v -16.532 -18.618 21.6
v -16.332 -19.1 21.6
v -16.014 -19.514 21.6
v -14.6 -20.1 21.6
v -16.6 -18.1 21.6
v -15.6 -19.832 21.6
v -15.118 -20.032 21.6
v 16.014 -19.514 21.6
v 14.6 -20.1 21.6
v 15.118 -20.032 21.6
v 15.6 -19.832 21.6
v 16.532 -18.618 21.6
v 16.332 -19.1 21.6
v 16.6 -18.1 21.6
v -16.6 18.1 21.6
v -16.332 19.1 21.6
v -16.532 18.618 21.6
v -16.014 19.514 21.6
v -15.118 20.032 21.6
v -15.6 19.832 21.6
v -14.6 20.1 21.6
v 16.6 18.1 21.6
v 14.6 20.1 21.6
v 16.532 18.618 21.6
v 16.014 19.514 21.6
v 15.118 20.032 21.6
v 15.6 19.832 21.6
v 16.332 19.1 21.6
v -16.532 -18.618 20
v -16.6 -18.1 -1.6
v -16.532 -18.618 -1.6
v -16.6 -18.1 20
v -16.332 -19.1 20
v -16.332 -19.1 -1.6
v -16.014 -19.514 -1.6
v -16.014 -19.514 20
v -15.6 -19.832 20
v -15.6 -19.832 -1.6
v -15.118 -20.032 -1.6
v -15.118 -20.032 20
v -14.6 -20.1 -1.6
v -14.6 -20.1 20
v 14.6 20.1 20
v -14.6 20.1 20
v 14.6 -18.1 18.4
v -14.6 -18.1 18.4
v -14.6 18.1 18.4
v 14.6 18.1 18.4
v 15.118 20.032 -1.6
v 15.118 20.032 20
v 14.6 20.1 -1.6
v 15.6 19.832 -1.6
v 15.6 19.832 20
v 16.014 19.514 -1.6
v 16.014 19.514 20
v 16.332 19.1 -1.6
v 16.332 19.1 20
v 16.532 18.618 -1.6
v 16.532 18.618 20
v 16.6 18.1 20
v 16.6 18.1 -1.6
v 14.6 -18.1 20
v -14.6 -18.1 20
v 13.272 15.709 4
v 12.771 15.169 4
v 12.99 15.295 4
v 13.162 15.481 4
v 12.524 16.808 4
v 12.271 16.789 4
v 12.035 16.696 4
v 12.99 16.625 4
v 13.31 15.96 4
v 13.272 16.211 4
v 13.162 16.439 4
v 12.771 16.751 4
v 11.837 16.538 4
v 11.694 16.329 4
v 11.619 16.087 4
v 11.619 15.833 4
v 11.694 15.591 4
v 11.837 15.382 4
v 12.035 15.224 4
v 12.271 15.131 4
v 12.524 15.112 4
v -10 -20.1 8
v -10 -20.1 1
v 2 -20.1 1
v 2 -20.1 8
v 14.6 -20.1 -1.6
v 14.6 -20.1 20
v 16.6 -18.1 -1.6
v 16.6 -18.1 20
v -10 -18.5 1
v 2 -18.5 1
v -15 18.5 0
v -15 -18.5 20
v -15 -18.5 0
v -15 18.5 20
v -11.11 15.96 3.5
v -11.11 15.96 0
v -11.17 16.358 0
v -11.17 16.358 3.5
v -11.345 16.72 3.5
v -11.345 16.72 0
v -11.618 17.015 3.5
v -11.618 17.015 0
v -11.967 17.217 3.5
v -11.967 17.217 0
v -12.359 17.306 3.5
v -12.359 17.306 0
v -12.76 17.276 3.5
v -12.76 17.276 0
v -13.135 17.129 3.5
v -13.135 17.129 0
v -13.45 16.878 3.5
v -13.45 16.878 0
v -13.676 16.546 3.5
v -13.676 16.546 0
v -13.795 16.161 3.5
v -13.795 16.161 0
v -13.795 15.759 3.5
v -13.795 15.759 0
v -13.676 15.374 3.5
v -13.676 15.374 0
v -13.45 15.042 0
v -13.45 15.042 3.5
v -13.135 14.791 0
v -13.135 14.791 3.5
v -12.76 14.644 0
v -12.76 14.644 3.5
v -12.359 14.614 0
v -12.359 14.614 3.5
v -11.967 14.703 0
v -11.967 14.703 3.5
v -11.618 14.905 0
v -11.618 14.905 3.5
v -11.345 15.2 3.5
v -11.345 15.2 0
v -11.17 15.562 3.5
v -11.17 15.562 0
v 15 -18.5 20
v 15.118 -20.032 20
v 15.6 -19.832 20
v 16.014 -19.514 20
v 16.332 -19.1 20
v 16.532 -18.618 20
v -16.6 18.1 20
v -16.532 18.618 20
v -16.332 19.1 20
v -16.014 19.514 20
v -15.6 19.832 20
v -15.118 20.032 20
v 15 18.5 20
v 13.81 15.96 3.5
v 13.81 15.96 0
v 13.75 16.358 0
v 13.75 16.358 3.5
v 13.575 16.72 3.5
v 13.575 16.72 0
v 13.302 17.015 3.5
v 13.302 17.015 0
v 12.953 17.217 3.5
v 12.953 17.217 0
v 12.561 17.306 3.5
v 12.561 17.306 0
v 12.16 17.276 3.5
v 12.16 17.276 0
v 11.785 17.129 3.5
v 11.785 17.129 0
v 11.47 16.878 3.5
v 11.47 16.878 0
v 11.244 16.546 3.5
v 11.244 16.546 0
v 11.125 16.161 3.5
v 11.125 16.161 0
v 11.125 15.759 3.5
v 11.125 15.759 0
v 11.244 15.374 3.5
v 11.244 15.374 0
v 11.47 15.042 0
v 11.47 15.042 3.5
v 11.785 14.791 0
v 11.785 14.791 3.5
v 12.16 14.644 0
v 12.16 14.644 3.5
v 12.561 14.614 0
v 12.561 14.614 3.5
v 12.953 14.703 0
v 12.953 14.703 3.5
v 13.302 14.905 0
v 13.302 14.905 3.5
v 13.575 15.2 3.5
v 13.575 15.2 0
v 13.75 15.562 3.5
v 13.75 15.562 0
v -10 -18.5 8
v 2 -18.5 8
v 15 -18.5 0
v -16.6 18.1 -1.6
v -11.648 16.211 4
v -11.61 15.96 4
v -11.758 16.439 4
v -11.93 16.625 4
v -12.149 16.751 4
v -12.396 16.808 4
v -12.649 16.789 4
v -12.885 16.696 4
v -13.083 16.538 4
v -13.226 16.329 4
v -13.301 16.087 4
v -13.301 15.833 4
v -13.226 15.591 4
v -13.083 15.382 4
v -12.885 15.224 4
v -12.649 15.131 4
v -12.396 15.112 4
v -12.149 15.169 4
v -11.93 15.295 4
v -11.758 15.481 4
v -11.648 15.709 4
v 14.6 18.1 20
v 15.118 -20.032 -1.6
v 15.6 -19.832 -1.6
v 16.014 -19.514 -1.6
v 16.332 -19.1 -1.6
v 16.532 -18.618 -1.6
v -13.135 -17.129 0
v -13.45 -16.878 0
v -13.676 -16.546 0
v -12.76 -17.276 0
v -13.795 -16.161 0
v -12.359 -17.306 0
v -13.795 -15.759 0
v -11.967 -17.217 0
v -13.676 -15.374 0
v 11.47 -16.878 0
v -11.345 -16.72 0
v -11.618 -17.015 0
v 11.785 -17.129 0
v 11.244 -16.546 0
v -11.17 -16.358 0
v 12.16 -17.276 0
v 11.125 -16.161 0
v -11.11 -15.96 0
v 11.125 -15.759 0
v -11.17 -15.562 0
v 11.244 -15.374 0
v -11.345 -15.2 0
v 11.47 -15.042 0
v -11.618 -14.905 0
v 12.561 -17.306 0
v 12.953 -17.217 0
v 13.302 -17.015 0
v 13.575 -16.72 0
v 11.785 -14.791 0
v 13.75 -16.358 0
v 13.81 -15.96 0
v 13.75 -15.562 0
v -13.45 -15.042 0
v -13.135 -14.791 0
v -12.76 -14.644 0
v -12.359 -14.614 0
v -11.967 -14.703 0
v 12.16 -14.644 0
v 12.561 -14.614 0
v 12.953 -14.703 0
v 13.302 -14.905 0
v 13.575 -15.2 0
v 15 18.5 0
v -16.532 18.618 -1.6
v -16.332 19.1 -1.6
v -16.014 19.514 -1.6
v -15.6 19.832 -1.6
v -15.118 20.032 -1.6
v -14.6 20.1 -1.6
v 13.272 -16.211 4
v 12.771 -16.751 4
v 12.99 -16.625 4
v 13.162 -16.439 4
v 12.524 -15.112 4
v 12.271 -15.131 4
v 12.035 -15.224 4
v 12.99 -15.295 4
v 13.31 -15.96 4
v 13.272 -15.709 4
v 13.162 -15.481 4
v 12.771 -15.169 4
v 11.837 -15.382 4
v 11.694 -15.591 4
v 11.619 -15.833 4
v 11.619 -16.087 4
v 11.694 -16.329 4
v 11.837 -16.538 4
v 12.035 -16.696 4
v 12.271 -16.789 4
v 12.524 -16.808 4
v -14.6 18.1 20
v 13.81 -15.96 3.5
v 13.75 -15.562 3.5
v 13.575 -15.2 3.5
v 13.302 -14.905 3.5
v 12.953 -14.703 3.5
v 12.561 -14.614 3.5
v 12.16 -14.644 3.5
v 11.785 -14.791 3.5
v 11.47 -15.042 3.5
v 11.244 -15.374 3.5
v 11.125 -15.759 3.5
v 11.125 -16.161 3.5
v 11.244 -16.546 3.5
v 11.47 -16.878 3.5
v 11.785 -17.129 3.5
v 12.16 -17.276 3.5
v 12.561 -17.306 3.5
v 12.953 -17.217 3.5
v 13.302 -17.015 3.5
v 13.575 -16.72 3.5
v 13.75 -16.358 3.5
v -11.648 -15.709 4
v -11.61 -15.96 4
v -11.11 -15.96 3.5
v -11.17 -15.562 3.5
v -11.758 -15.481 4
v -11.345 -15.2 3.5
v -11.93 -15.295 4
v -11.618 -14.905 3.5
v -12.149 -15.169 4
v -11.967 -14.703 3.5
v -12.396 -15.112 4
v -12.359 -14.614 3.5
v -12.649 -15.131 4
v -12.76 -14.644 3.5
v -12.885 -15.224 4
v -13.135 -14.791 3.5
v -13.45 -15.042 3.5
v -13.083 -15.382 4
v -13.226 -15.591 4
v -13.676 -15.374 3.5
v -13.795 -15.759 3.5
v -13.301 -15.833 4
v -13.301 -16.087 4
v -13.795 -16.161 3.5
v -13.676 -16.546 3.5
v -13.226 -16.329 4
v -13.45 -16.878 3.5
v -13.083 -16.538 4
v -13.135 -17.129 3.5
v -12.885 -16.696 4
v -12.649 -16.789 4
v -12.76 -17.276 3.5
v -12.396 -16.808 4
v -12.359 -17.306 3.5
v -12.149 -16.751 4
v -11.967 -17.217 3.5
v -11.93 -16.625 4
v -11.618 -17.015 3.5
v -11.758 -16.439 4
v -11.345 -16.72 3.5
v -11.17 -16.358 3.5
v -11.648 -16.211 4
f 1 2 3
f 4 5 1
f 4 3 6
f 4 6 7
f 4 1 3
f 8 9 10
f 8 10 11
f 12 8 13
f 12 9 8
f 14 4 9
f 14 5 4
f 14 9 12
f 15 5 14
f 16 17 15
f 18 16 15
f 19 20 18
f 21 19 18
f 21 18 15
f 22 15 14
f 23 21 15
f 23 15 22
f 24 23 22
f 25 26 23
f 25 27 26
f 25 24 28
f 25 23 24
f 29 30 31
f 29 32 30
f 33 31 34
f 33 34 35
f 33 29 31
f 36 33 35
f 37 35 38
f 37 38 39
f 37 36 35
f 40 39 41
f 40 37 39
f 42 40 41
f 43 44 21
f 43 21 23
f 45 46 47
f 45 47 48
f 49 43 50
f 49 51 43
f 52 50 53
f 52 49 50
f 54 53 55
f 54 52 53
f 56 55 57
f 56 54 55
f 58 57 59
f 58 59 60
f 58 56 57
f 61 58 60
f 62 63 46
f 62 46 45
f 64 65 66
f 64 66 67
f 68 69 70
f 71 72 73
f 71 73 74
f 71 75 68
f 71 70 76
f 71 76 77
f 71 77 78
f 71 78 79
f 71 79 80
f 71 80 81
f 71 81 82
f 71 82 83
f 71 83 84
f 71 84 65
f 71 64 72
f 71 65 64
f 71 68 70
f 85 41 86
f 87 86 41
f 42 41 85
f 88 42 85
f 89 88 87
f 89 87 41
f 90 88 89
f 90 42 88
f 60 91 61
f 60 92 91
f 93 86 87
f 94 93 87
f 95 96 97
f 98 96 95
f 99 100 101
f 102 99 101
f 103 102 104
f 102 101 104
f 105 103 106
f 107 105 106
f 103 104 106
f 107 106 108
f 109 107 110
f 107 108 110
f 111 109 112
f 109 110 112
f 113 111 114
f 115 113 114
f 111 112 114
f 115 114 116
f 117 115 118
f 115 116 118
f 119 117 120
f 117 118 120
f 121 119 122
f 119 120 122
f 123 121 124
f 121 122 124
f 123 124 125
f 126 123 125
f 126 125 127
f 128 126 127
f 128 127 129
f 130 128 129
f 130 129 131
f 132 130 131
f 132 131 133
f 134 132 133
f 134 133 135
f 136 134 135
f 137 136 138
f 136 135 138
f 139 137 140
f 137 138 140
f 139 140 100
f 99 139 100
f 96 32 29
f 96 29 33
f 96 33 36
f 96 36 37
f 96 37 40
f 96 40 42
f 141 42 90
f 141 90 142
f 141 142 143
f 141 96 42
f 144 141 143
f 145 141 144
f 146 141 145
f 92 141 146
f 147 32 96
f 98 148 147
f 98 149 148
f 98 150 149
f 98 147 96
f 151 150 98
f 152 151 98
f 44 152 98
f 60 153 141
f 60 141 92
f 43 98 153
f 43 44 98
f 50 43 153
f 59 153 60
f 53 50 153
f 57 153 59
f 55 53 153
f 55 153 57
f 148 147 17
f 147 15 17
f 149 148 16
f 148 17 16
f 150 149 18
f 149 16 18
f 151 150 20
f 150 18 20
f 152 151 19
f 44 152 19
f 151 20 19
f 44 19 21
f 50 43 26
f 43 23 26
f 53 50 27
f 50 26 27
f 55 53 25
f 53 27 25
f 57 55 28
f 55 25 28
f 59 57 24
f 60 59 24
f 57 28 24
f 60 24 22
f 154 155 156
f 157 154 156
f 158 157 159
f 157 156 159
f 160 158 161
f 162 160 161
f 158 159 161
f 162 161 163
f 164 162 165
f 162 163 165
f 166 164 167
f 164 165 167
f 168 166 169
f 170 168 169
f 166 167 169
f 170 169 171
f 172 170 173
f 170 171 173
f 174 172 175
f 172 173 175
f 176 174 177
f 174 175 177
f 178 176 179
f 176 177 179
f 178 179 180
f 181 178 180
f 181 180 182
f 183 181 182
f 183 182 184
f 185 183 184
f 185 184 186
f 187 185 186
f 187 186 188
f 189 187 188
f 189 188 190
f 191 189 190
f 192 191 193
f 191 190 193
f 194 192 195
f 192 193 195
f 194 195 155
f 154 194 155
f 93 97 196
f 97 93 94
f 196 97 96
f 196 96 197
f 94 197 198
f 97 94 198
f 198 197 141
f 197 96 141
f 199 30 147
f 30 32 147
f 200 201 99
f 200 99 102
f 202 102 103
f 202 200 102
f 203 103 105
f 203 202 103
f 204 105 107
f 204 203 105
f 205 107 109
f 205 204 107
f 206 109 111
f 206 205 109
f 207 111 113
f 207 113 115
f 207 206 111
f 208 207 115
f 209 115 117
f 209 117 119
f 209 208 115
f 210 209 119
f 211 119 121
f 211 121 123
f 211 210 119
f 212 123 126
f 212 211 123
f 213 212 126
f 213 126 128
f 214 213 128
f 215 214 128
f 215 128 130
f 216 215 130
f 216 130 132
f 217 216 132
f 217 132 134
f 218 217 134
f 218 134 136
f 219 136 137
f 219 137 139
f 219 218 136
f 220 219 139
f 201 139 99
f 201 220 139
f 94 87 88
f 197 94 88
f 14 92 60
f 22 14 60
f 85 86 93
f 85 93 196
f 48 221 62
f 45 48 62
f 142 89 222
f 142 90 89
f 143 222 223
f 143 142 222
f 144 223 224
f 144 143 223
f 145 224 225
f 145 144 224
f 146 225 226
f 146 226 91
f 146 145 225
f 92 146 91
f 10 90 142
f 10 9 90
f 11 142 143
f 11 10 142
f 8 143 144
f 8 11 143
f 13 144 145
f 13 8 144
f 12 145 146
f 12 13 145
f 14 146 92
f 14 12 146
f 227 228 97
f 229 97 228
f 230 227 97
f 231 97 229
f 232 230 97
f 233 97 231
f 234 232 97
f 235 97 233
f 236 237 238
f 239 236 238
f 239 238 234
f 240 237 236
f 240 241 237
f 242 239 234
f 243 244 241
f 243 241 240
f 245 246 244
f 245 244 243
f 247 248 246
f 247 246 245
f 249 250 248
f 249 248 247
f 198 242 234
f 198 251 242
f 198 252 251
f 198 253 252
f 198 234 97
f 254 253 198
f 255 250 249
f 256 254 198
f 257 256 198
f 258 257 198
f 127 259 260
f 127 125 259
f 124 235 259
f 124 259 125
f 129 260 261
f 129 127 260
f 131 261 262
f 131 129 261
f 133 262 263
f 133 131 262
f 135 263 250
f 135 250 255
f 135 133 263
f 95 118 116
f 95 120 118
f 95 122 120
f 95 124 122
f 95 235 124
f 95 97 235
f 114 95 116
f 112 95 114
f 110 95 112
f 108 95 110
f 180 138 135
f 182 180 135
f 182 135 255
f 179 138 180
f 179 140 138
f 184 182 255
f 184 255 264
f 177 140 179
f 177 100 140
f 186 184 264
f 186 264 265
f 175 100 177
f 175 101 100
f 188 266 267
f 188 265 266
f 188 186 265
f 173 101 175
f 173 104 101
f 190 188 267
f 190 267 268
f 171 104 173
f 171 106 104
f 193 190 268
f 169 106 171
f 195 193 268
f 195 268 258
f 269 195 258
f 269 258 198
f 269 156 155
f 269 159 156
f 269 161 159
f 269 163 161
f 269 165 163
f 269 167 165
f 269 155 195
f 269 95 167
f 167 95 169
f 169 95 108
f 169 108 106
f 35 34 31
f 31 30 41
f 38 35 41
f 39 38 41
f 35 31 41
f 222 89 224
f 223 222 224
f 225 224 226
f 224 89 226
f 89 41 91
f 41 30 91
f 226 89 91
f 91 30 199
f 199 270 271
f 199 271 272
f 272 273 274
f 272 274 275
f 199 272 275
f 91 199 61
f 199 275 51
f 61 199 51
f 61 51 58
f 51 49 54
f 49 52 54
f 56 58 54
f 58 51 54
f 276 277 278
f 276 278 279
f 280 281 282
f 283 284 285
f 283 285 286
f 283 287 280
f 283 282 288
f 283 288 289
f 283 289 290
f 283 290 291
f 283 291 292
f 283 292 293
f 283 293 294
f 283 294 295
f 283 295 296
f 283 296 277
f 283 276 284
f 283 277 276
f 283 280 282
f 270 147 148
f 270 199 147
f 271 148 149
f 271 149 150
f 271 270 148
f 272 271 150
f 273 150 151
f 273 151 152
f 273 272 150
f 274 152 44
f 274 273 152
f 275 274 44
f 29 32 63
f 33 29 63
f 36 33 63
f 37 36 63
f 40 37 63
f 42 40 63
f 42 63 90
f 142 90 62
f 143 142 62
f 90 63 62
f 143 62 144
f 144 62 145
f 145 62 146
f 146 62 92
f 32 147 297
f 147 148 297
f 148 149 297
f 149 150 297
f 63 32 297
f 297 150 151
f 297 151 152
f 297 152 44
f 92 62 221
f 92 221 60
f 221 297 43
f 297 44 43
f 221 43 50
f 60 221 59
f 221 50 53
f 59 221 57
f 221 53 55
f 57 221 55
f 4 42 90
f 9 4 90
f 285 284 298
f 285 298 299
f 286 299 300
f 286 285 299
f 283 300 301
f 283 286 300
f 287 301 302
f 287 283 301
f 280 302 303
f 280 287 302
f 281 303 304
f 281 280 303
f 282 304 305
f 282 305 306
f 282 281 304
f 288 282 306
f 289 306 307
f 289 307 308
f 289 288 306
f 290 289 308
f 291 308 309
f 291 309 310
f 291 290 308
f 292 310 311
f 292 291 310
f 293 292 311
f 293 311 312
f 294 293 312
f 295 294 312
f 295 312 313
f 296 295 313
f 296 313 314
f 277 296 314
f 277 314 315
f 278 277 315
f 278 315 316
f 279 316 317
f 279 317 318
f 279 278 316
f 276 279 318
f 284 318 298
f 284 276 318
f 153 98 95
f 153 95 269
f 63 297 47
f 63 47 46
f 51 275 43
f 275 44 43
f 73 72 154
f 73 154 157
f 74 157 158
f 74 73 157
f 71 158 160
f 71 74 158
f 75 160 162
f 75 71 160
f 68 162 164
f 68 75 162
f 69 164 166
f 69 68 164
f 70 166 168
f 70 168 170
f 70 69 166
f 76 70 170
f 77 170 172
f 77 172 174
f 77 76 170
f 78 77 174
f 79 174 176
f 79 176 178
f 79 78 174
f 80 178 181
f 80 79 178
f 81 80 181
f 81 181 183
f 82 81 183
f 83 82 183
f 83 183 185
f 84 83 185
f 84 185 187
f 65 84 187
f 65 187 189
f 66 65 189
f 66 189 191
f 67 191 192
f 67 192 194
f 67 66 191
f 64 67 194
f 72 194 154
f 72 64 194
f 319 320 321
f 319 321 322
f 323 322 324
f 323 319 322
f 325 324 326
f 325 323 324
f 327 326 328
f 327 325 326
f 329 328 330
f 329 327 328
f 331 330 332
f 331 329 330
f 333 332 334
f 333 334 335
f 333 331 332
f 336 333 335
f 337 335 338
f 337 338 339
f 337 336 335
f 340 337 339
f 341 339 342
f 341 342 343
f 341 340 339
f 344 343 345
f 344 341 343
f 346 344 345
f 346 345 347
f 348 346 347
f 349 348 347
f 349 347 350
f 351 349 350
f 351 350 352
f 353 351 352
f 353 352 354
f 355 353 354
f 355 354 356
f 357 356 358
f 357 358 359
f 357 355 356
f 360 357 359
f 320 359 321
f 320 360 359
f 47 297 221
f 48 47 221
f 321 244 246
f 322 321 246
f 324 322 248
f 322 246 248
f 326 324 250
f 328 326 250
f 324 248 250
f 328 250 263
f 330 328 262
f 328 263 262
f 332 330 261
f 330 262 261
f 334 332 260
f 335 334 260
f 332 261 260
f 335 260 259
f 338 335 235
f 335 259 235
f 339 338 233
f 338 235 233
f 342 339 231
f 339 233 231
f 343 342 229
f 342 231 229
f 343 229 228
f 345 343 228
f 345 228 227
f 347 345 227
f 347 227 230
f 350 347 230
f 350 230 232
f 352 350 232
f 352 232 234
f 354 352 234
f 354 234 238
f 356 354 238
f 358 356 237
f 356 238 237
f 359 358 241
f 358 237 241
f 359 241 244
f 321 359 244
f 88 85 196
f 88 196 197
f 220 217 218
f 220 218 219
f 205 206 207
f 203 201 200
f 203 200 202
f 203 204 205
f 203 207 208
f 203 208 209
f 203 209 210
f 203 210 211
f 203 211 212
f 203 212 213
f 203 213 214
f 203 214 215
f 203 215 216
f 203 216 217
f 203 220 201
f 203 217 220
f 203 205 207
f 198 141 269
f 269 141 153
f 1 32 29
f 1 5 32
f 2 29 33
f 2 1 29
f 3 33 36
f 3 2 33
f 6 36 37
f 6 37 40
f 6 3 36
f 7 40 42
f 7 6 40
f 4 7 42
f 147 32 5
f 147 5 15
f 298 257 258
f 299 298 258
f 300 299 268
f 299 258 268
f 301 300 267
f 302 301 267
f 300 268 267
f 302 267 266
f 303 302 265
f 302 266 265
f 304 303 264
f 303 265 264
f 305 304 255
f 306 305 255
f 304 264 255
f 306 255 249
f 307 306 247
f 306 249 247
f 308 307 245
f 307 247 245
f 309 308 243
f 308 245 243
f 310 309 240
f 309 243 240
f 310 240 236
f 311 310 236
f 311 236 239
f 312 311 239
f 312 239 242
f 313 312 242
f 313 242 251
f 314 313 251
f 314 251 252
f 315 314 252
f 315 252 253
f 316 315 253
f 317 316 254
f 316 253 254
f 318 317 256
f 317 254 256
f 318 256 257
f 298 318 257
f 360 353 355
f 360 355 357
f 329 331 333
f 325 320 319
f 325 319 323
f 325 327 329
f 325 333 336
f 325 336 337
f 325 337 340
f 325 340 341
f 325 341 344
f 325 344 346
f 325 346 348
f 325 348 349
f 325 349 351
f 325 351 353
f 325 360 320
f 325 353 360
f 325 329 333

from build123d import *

# Parameters (mm, degrees)
F0_W          = 33.2
F0_H          = 40.2
F0_W_2        = 30
F0_H_2        = 37
F1_DEPTH      = 20
F1_DEPTH_BACK = 1.6
F2_DEPTH      = 1.6
F3_R          = 1.35
F4_DEPTH      = 4
F5_SIZE       = 0.5
F6_W          = 33.2
F6_H          = 40.2
F6_W_2        = 30
F6_H_2        = 37
F7_DEPTH      = 1.6
F8_W          = 29.2
F8_H          = 36.2
F9_DEPTH      = 1.6
F10_W         = 12
F10_H         = 7
F11_DEPTH     = 1.6
F12_R         = 2
F12_2_R       = 2


with BuildPart() as f1:
    # F0 (on Top) → F1 (new body, two sides)
    with BuildSketch(Plane.XY) as f1_sk:
        Rectangle(F0_W, F0_H)
        Rectangle(F0_W_2, F0_H_2, mode=Mode.SUBTRACT)
    extrude(amount=F1_DEPTH)
    extrude(f1_sk.sketch, amount=-F1_DEPTH_BACK)

    # F0 (on Top) → F2 (join)
    with BuildSketch(Plane.XY):
        Rectangle(F0_W_2, F0_H_2)
    extrude(amount=-F2_DEPTH)

    # F3 (on face) → F4 (join)
    with BuildSketch(Plane.XY):
        with Locations((12.46, 15.96)):
            Circle(F3_R)
        with Locations((12.46, -15.96)):
            Circle(F3_R)
        with Locations((-12.46, -15.96)):
            Circle(F3_R)
        with Locations((-12.46, 15.96)):
            Circle(F3_R)
    extrude(amount=F4_DEPTH)

    # F5
    f5_edges = [f1.edges().sort_by_distance(p)[0] for p in [
        (-13.81, 15.96, 4),
        (11.11, 15.96, 4),
        (11.11, -15.96, 4),
        (-13.81, -15.96, 4),
    ]]
    chamfer(f5_edges, length=F5_SIZE)

    # F10 (on face) → F11 (cut, through all)
    with BuildSketch(Plane.XZ.offset(20.1)):
        with Locations((-4, 4.5)):
            Rectangle(F10_W, F10_H)
    extrude(amount=-F11_DEPTH, mode=Mode.SUBTRACT)

    # F12
    f12_edges = [f1.edges().sort_by_distance(p)[0] for p in [
        (16.6, -20.1, 9.2),
        (16.6, 20.1, 9.2),
        (-16.6, 20.1, 9.2),
        (-16.6, -20.1, 9.2),
    ]]
    fillet(f12_edges, radius=F12_R)


with BuildPart() as f7:
    # F6 (on face) → F7 (new body)
    with BuildSketch(Plane.XY.offset(20)):
        Rectangle(F6_W, F6_H)
        Rectangle(F6_W_2, F6_H_2, mode=Mode.SUBTRACT)
        Rectangle(F6_W_2, F6_H_2)
    extrude(amount=F7_DEPTH)

    # F8 (on face) → F9 (join)
    with BuildSketch(Plane(origin=(0, 0, 20), x_dir=(1, 0, 0), z_dir=(0, 0, -1))):
        Rectangle(F8_W, F8_H)
    extrude(amount=F9_DEPTH)

    # F12#2
    f12_2_edges = [f7.edges().sort_by_distance(p)[0] for p in [
        (16.6, -20.1, 20.8),
        (-16.6, 20.1, 20.8),
        (16.6, 20.1, 20.8),
        (-16.6, -20.1, 20.8),
    ]]
    fillet(f12_2_edges, radius=F12_2_R)


solid = Compound([f1.part, f7.part])
